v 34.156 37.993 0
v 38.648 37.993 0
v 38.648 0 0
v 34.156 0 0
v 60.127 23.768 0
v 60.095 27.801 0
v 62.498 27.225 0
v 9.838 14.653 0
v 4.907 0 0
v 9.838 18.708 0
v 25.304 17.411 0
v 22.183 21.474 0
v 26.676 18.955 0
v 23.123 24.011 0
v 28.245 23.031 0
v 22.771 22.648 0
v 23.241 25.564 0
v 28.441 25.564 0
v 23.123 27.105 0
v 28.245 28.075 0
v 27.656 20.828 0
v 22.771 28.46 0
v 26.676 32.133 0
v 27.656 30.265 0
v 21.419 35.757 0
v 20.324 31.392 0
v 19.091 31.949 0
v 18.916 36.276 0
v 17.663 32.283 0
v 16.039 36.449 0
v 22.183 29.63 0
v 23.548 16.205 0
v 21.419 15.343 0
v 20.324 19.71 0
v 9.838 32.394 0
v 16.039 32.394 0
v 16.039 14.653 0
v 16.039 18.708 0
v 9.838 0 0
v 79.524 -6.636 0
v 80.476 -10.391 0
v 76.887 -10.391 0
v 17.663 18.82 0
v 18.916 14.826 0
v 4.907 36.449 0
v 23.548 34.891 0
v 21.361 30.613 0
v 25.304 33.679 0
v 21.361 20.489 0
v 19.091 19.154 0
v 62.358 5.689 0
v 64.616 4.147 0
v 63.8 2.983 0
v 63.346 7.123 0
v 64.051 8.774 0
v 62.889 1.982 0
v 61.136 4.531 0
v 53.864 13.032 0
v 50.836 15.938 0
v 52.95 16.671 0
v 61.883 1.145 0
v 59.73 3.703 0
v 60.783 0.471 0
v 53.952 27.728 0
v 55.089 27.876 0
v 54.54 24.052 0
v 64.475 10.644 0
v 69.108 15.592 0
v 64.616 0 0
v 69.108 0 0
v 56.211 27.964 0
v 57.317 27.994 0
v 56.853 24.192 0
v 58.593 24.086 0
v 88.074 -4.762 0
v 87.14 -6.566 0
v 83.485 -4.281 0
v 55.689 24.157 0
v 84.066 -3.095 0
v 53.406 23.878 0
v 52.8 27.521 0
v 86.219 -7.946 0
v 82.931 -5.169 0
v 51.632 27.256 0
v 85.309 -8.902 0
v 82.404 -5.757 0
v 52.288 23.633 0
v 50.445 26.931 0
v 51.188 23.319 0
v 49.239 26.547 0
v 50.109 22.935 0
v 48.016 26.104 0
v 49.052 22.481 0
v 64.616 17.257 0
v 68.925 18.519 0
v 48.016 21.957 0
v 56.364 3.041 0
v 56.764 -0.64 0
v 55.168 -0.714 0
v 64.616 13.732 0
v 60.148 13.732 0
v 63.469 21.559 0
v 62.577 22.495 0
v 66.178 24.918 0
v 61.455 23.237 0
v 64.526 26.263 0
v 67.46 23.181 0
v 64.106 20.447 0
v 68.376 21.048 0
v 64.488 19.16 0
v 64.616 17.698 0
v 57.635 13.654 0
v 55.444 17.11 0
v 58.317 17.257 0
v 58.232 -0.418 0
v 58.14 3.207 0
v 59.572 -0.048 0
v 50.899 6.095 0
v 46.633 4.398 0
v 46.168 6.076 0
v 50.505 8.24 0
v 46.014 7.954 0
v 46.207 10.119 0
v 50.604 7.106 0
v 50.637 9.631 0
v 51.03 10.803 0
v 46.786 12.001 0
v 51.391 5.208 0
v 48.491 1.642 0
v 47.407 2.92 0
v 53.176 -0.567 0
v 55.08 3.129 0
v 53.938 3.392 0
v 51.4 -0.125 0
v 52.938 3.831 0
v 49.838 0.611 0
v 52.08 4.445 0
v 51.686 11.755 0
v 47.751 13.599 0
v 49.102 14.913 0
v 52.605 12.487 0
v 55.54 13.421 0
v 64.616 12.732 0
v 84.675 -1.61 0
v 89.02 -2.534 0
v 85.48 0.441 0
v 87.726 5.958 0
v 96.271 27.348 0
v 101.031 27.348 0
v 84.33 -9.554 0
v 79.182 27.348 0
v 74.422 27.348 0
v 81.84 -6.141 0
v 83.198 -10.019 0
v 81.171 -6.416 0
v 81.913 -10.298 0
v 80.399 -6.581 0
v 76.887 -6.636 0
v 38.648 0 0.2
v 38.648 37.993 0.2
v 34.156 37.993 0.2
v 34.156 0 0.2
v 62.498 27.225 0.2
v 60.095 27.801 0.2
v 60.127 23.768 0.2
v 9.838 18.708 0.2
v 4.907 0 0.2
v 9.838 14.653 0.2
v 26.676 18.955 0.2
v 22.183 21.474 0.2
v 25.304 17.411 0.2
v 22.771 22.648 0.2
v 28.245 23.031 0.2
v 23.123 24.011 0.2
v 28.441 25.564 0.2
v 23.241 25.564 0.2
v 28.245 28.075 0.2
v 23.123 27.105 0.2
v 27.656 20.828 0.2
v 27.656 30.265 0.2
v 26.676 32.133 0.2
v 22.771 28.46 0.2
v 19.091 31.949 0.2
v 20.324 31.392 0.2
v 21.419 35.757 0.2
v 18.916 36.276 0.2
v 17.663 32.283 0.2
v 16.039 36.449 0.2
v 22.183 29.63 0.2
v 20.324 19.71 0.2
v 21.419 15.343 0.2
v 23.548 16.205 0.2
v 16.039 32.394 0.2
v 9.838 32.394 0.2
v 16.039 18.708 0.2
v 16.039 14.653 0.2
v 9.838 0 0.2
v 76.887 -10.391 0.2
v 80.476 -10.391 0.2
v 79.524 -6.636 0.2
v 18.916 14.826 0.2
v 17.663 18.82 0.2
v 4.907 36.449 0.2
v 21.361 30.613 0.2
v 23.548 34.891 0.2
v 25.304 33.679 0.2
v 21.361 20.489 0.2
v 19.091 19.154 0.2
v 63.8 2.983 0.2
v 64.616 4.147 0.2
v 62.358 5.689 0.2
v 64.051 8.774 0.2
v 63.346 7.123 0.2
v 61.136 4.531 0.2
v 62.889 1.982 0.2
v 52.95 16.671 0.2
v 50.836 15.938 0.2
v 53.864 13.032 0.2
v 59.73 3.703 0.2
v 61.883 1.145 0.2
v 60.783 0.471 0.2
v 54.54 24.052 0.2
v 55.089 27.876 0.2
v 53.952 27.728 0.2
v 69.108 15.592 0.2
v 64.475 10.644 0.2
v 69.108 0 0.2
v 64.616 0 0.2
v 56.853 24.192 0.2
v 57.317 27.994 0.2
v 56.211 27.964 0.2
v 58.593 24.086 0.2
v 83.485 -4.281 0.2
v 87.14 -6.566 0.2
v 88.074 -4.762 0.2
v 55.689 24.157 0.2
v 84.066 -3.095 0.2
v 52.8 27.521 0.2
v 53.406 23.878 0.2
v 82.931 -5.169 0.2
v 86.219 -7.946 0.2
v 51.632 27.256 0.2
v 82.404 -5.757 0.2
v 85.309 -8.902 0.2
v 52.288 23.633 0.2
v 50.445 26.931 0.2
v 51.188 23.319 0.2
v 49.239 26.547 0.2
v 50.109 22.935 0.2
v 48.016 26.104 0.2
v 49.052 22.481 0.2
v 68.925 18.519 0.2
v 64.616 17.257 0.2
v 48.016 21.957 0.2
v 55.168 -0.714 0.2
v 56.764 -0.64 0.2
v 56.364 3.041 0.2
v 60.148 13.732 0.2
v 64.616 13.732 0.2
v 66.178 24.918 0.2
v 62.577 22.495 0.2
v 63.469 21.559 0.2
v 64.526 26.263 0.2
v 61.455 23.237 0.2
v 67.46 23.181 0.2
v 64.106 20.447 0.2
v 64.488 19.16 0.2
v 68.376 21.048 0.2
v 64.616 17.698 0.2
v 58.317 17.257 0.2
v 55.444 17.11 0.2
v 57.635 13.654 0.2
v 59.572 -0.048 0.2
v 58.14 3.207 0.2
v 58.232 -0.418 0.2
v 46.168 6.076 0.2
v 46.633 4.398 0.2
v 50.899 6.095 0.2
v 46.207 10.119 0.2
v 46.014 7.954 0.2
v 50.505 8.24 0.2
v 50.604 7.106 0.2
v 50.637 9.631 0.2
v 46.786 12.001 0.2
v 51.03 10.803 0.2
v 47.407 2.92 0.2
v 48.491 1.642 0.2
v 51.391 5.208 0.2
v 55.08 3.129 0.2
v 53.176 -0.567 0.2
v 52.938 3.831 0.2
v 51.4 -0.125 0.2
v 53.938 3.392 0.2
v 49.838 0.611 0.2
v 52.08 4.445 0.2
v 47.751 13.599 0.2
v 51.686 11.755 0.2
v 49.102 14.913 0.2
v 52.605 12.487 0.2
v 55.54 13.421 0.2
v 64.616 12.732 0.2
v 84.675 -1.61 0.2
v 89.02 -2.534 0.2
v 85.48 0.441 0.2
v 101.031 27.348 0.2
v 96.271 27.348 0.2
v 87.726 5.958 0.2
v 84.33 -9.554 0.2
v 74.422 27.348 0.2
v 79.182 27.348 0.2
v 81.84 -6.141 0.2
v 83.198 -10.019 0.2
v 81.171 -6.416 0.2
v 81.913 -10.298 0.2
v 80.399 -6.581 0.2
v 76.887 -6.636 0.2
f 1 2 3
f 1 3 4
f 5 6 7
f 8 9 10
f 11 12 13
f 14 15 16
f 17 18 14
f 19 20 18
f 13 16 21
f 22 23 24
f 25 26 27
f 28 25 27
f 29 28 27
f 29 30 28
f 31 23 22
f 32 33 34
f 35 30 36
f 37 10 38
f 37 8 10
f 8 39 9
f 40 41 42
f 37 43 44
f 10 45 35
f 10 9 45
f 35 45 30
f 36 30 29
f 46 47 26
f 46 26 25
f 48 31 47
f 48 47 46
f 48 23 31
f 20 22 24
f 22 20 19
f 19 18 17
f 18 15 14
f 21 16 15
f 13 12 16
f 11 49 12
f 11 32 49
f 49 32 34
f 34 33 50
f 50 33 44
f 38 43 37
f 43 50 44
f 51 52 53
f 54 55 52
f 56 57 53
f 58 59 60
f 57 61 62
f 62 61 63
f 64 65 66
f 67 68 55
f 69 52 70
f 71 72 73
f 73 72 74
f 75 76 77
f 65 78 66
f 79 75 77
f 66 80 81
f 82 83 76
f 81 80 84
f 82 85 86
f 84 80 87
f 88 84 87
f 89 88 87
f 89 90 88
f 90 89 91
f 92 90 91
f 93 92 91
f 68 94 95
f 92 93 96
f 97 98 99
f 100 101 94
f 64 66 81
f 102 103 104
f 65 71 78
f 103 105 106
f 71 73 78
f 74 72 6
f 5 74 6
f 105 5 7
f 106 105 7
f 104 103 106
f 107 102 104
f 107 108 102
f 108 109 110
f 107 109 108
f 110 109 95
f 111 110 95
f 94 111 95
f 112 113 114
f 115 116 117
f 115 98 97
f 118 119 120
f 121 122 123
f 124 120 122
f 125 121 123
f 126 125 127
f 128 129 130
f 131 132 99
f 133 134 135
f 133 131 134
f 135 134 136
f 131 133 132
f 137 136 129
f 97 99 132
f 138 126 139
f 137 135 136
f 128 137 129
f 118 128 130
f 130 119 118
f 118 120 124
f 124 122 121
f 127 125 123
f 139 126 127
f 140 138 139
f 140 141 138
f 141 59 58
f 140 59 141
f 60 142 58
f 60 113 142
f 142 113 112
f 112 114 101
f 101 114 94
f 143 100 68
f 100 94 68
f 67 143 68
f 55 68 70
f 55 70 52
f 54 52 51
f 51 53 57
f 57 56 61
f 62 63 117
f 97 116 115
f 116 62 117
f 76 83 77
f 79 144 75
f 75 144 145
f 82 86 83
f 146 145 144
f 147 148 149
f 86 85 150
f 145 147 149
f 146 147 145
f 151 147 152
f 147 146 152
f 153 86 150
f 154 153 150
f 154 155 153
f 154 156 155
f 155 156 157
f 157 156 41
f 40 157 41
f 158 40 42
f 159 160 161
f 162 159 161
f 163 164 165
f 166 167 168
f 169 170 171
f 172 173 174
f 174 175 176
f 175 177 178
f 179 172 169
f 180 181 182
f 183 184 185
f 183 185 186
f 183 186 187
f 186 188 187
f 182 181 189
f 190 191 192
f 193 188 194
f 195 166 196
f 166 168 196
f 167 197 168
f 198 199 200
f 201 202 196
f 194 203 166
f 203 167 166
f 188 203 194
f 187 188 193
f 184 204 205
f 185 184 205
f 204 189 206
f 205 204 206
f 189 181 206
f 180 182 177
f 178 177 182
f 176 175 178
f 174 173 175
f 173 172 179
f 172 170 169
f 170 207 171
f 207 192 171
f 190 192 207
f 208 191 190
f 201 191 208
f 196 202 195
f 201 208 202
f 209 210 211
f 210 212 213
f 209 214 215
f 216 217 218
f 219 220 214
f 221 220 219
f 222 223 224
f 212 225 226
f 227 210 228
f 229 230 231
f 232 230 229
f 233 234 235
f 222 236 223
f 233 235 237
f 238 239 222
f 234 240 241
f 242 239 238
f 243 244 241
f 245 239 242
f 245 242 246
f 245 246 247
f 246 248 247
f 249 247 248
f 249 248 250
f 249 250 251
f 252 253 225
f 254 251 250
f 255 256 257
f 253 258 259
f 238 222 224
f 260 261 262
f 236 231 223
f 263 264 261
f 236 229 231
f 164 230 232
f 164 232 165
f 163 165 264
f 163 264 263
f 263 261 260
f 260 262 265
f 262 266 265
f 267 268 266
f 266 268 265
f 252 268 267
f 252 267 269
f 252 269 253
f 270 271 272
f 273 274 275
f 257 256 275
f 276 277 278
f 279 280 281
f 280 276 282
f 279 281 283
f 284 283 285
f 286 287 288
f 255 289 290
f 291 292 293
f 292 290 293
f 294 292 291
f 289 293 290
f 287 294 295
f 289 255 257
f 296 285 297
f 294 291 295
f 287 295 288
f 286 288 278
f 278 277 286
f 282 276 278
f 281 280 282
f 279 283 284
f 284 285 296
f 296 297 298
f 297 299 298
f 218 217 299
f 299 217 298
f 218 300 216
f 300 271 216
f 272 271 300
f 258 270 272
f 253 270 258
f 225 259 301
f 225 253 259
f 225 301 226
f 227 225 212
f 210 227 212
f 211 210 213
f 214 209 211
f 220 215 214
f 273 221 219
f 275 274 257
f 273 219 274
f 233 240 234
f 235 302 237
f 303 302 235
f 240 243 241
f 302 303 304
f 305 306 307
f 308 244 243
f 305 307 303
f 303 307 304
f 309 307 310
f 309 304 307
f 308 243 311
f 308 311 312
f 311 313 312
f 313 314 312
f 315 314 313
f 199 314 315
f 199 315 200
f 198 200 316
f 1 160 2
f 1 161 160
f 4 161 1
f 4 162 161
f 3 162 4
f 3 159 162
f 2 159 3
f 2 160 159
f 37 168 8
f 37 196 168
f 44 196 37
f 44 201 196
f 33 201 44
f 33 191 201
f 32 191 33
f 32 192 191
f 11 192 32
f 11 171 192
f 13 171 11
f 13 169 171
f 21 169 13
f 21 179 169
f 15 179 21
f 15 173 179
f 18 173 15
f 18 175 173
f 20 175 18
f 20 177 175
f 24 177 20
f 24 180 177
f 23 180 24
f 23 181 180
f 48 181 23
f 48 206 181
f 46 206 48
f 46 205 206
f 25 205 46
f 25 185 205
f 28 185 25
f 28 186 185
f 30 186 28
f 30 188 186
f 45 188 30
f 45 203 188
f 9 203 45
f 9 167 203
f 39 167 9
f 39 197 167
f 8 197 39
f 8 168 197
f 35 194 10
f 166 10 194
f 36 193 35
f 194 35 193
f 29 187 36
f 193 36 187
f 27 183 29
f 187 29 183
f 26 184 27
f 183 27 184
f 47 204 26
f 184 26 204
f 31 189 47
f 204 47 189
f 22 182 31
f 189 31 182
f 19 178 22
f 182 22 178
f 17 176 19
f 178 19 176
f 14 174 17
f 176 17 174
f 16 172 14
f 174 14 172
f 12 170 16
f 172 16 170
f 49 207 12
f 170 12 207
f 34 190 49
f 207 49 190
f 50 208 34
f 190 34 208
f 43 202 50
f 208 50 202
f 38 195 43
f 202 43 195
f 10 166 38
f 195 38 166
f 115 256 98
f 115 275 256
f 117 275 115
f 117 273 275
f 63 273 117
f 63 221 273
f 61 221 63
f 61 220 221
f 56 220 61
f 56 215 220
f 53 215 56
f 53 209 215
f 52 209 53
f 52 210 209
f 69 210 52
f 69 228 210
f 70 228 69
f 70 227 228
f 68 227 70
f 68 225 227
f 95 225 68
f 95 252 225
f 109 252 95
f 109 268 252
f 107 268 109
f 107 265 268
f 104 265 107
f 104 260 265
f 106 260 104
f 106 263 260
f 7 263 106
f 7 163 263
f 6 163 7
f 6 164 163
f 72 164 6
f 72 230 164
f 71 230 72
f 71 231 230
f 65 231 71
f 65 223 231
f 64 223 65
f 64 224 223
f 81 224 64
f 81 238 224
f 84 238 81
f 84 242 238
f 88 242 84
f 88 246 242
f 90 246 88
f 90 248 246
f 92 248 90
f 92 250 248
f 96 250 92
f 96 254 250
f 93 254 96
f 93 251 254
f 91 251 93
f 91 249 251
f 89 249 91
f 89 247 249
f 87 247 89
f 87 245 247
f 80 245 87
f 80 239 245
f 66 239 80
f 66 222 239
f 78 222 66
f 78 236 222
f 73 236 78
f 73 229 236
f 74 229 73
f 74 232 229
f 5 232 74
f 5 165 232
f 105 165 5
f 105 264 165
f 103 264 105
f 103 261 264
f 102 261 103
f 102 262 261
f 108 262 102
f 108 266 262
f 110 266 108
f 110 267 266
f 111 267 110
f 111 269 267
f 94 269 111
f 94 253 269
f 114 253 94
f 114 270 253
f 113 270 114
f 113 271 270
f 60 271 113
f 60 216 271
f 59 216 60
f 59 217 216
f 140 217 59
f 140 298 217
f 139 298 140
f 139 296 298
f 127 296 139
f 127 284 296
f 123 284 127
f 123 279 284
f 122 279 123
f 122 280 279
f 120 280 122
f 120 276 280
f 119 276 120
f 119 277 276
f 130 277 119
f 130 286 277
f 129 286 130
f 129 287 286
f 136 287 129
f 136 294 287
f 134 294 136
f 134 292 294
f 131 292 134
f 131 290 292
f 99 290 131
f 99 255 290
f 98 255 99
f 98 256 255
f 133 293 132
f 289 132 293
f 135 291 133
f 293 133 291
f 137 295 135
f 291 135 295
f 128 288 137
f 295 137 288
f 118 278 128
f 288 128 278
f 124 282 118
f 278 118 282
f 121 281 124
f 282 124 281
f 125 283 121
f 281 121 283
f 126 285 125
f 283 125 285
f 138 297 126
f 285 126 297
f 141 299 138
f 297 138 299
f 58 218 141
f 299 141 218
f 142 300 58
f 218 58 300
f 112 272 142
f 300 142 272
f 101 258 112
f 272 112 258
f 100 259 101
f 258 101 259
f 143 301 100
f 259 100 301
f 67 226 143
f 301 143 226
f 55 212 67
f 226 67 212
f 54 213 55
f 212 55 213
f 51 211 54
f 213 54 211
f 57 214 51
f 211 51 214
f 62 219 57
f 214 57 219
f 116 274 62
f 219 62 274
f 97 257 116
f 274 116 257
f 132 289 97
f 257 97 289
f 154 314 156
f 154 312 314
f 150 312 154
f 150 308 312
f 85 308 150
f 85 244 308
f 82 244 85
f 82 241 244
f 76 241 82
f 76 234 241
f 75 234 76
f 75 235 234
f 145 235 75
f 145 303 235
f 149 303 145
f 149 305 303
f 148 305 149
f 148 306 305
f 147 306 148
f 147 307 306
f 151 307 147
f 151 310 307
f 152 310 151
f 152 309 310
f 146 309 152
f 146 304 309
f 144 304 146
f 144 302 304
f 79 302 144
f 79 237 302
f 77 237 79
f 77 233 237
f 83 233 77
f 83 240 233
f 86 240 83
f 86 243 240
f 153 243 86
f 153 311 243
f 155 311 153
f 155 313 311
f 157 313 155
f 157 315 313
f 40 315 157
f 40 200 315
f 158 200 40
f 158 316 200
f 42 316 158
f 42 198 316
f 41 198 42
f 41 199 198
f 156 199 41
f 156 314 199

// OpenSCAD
linear_extrude(0.2) text("Play", size = 36, font = "Beleren2016");
